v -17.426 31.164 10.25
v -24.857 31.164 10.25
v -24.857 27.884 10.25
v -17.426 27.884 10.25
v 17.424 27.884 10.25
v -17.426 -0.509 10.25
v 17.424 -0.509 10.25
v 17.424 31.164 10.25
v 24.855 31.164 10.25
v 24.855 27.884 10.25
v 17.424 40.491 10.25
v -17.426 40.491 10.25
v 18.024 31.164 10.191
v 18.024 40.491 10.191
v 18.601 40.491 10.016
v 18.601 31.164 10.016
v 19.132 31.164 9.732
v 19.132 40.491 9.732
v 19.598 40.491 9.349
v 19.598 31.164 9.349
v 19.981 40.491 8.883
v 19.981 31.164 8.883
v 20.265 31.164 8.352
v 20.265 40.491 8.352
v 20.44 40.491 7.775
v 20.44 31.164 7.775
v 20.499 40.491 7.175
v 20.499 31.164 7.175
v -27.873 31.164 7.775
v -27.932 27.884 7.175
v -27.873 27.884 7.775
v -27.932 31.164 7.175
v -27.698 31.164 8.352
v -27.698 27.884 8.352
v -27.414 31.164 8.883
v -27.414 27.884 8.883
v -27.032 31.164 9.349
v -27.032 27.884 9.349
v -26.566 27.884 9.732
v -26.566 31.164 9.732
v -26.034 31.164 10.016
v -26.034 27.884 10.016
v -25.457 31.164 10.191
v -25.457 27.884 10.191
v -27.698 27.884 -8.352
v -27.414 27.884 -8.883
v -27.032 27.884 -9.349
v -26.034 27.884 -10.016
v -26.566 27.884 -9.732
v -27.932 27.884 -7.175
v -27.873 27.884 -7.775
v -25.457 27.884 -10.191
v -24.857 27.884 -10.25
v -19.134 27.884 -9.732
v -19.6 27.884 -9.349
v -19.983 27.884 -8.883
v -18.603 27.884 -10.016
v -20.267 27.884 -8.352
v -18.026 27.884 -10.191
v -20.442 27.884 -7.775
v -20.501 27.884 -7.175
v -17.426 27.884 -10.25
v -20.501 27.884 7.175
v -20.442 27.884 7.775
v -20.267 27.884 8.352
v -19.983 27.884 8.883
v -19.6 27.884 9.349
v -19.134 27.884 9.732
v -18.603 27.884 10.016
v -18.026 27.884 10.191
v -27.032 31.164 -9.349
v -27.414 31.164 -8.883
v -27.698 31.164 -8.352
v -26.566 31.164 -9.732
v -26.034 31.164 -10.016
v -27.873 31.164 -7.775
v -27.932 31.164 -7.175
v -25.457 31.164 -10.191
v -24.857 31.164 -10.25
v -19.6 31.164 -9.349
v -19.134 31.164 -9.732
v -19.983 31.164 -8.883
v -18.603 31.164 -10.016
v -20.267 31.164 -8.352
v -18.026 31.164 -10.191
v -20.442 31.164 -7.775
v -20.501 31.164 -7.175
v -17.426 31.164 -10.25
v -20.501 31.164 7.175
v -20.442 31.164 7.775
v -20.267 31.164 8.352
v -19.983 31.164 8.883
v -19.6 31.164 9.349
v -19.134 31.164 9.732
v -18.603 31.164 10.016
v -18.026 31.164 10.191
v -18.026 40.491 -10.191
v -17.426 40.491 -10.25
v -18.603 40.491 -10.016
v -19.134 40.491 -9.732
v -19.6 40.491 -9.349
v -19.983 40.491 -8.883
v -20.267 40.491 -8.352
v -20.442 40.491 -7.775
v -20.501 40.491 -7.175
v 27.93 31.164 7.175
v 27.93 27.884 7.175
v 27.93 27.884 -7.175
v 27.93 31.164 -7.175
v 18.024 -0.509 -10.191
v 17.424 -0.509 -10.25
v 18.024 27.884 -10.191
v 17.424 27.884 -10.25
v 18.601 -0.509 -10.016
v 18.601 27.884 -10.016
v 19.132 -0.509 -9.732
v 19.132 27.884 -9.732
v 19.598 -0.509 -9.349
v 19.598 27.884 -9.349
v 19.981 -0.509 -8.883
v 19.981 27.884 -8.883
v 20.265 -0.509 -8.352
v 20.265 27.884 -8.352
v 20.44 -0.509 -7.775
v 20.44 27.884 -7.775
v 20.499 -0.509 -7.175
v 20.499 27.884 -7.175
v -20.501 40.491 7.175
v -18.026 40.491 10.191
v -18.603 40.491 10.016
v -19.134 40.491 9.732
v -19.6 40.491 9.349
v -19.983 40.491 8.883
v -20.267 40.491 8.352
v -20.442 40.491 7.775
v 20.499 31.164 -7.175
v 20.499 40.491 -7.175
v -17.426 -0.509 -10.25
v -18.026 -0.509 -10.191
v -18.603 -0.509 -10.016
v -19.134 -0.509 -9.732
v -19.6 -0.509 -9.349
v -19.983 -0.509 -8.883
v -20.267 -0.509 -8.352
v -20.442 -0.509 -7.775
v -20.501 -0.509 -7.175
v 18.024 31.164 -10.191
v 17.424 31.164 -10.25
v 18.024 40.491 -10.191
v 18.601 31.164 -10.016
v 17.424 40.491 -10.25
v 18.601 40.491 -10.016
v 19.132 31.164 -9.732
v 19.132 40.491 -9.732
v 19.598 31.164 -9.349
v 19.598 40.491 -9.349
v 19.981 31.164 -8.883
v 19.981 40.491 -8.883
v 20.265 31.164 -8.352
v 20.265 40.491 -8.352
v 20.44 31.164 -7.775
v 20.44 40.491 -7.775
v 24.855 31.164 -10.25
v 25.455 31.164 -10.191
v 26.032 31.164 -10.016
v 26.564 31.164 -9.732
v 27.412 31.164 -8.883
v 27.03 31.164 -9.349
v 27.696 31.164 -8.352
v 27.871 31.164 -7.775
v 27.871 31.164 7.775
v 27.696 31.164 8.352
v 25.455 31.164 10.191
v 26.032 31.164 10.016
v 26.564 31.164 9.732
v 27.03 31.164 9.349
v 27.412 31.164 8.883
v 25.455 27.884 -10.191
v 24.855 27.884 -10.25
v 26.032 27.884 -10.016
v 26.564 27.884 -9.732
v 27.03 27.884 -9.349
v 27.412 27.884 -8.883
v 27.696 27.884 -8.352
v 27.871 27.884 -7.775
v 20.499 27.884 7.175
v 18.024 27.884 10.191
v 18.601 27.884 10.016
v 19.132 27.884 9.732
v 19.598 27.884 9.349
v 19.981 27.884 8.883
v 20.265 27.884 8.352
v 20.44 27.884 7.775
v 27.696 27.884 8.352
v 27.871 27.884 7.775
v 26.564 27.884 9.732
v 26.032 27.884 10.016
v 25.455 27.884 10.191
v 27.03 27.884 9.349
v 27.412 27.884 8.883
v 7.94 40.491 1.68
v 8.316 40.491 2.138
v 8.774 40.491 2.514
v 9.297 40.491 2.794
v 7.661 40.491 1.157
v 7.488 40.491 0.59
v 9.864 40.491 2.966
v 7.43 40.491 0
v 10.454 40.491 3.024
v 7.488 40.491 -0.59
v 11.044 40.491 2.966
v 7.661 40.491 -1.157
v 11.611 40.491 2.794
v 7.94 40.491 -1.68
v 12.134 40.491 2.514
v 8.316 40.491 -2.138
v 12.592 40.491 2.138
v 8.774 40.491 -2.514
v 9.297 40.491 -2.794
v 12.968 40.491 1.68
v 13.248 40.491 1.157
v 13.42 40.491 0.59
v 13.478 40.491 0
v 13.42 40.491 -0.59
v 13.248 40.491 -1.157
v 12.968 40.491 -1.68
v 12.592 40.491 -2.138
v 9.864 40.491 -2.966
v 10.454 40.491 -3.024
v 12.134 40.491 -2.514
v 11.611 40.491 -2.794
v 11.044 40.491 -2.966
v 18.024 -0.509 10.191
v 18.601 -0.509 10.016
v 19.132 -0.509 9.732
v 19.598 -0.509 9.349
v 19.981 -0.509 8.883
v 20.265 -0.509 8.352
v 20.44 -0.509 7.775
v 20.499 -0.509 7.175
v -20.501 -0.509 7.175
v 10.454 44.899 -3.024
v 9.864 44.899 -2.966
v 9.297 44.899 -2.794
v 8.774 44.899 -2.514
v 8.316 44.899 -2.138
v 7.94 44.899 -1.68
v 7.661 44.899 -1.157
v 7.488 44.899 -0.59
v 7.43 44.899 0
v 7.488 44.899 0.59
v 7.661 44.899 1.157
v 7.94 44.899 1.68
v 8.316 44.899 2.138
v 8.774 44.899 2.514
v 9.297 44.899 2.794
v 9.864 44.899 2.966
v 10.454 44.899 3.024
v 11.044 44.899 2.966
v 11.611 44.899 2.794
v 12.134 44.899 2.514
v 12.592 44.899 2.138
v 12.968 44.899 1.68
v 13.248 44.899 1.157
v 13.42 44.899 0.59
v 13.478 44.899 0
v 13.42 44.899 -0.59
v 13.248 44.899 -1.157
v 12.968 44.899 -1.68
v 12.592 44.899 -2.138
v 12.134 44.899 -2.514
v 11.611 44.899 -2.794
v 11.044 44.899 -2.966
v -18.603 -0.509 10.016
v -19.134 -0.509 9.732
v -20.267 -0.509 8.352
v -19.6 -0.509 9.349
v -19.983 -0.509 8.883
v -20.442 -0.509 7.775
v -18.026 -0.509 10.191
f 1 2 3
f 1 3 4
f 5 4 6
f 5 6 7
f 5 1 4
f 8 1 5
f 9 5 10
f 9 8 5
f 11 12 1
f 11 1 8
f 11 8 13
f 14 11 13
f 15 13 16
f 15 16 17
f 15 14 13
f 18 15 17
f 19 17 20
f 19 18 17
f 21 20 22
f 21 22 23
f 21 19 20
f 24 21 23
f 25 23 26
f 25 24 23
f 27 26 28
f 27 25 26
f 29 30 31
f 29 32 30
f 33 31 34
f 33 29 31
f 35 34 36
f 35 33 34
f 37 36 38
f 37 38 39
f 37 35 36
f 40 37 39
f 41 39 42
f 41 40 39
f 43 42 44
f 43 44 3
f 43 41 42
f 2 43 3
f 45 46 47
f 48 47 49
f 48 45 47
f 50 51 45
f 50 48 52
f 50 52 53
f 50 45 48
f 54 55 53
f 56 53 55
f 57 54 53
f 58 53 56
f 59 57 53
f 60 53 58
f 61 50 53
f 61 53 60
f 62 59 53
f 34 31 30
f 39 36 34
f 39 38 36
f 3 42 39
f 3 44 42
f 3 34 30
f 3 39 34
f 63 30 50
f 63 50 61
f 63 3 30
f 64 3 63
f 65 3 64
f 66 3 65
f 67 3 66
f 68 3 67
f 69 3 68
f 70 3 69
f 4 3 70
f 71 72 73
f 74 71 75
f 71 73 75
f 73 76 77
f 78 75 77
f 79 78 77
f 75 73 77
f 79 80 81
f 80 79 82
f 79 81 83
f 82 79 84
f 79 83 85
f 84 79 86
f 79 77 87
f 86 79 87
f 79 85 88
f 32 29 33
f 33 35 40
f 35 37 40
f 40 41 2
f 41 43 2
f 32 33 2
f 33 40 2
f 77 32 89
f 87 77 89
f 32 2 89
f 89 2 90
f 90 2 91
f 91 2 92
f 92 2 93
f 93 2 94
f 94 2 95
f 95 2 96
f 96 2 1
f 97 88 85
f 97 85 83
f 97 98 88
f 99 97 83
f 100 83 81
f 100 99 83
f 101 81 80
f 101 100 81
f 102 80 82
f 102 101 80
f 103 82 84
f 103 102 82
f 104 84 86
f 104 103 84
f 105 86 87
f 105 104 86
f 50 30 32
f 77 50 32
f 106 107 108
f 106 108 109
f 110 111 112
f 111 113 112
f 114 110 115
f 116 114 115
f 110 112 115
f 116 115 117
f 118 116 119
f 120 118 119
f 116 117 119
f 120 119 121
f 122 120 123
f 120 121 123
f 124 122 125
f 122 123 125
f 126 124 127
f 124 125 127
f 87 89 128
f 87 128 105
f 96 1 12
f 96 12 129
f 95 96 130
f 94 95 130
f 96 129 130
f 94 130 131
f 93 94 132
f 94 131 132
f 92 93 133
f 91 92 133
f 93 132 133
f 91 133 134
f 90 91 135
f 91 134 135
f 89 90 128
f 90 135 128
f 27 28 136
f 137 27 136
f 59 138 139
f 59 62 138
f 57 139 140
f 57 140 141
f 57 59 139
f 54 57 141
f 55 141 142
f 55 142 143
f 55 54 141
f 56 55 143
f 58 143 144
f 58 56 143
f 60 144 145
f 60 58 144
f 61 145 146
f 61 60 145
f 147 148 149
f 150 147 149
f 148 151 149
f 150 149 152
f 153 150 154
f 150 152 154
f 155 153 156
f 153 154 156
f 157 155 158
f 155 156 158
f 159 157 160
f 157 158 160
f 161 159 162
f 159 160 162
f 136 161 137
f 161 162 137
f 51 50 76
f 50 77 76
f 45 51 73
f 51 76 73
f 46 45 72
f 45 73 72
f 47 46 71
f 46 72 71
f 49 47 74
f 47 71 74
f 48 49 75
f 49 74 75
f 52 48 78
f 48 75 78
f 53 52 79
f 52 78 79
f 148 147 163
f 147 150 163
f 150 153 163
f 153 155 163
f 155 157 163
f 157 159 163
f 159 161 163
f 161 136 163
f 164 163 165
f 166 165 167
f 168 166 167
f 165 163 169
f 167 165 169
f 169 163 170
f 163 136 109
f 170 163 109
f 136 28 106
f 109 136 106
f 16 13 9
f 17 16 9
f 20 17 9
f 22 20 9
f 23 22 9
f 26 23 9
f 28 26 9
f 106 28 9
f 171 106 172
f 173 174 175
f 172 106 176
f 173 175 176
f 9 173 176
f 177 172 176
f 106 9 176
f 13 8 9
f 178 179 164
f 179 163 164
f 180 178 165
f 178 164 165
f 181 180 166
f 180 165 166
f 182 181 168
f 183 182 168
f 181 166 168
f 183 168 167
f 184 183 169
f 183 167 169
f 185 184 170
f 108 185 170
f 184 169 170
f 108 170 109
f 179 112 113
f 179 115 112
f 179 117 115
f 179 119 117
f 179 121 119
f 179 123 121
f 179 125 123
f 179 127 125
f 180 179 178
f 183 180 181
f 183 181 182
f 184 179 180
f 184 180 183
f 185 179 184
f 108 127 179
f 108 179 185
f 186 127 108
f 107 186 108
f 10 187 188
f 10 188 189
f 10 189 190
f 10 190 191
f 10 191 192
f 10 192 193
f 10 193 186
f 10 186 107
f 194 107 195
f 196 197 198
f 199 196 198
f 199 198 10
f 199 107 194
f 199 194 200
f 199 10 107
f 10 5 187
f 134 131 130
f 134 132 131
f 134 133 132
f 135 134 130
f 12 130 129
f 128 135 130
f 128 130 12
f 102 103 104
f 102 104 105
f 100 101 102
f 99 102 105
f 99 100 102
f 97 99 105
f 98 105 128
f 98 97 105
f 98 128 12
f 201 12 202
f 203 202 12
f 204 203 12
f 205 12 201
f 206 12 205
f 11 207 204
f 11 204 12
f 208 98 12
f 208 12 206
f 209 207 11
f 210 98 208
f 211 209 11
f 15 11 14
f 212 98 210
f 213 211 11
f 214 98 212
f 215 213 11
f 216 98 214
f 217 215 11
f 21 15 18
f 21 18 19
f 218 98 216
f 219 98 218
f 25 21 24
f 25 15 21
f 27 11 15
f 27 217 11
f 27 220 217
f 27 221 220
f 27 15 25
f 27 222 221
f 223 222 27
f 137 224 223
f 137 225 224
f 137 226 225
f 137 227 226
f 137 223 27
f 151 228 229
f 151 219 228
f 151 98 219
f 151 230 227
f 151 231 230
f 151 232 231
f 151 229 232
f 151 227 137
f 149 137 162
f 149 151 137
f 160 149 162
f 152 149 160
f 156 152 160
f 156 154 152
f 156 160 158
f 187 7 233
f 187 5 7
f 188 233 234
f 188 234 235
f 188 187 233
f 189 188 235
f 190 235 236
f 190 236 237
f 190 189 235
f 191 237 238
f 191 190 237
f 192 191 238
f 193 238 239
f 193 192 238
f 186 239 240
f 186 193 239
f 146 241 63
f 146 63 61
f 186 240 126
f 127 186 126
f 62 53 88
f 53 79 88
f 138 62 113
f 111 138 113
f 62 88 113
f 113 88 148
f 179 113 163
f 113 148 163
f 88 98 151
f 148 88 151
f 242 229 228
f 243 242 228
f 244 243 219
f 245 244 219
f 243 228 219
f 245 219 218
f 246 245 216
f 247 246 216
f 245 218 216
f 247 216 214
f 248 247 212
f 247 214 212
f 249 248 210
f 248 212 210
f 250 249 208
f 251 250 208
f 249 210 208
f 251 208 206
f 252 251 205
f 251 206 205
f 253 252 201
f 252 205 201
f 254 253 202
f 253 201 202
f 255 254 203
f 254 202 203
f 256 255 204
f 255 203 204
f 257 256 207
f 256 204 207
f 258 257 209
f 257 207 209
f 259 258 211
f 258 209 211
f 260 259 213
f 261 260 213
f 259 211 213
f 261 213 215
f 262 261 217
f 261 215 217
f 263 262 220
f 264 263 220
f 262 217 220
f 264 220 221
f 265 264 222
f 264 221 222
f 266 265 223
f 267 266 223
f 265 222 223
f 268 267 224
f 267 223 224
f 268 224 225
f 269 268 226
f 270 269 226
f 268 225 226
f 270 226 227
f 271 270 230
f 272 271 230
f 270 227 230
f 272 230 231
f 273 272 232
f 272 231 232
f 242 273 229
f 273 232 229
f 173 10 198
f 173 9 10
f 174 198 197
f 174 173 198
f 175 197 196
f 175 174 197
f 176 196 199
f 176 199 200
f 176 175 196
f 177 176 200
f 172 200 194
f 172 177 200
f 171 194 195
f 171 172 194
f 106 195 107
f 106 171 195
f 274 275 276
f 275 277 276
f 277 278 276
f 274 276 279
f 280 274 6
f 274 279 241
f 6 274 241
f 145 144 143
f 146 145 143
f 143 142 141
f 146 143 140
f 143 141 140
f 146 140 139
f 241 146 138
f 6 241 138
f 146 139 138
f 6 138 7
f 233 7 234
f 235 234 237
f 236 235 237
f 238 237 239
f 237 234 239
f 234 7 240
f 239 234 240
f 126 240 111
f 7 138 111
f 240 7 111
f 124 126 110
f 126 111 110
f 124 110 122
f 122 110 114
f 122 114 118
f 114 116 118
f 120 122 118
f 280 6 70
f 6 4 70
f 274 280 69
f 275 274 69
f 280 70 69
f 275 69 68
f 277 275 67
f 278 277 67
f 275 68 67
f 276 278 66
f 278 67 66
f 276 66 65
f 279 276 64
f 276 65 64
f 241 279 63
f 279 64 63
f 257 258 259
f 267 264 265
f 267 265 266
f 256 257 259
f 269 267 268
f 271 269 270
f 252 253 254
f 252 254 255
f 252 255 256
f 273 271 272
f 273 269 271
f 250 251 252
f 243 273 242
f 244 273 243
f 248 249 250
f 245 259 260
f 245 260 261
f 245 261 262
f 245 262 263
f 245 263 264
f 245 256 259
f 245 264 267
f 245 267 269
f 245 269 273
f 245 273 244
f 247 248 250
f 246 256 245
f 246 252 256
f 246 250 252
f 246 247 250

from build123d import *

# Parameters (mm, degrees)
SKETCH1_W           = 40
SKETCH1_H           = 20
BOSS_EXTRUDE1_DEPTH = 40
SKETCH2_W           = 54.5
SKETCH2_H           = 3.2
BOSS_EXTRUDE2_DEPTH = 20
FILLET1_R           = 3
SKETCH3_R           = 2.95
BOSS_EXTRUDE3_DEPTH = 4.3
SCALE1_SCALE        = 1.025


with BuildPart() as part:
    # Sketch1 → Boss-Extrude1 (new body)
    with BuildSketch(Plane(origin=(0, 0, 0), x_dir=(1, 0, 0), z_dir=(0, 1, 0))):
        Rectangle(SKETCH1_W, SKETCH1_H)
    extrude(amount=BOSS_EXTRUDE1_DEPTH)

    # Sketch2 → Boss-Extrude2 (add)
    with BuildSketch(Plane.XY.offset(10)):
        with Locations((0, 29.3)):
            Rectangle(SKETCH2_W, SKETCH2_H)
    extrude(amount=-BOSS_EXTRUDE2_DEPTH)

    # Fillet1
    fillet1_edges = [part.edges().sort_by_distance(p)[0] for p in [
        (20, 13.85, 10),
        (-20, 13.85, 10),
        (-20, 13.85, -10),
        (20, 13.85, -10),
        (27.25, 29.3, 10),
        (27.25, 29.3, -10),
        (-27.25, 29.3, -10),
        (-27.25, 29.3, 10),
        (20, 35.45, 10),
        (-20, 35.45, 10),
        (-20, 35.45, -10),
        (20, 35.45, -10),
    ]]
    fillet(fillet1_edges, radius=FILLET1_R)

    # Sketch3 → Boss-Extrude3 (add)
    with BuildSketch(Plane(origin=(0, 40, 0), x_dir=(1, 0, 0), z_dir=(0, 1, 0))):
        with Locations(Location((10.2, 0, 0), (0, 0, 90))):
            Circle(SKETCH3_R)
    extrude(amount=BOSS_EXTRUDE3_DEPTH)


with BuildPart() as part_1:
    # Scale1: scaled about (0.036629402, 20.343175324, 0)
    add(part.part.scale(SCALE1_SCALE).moved(Location((-0.000915735, -0.508579383, 0))))


solid = part_1.part
